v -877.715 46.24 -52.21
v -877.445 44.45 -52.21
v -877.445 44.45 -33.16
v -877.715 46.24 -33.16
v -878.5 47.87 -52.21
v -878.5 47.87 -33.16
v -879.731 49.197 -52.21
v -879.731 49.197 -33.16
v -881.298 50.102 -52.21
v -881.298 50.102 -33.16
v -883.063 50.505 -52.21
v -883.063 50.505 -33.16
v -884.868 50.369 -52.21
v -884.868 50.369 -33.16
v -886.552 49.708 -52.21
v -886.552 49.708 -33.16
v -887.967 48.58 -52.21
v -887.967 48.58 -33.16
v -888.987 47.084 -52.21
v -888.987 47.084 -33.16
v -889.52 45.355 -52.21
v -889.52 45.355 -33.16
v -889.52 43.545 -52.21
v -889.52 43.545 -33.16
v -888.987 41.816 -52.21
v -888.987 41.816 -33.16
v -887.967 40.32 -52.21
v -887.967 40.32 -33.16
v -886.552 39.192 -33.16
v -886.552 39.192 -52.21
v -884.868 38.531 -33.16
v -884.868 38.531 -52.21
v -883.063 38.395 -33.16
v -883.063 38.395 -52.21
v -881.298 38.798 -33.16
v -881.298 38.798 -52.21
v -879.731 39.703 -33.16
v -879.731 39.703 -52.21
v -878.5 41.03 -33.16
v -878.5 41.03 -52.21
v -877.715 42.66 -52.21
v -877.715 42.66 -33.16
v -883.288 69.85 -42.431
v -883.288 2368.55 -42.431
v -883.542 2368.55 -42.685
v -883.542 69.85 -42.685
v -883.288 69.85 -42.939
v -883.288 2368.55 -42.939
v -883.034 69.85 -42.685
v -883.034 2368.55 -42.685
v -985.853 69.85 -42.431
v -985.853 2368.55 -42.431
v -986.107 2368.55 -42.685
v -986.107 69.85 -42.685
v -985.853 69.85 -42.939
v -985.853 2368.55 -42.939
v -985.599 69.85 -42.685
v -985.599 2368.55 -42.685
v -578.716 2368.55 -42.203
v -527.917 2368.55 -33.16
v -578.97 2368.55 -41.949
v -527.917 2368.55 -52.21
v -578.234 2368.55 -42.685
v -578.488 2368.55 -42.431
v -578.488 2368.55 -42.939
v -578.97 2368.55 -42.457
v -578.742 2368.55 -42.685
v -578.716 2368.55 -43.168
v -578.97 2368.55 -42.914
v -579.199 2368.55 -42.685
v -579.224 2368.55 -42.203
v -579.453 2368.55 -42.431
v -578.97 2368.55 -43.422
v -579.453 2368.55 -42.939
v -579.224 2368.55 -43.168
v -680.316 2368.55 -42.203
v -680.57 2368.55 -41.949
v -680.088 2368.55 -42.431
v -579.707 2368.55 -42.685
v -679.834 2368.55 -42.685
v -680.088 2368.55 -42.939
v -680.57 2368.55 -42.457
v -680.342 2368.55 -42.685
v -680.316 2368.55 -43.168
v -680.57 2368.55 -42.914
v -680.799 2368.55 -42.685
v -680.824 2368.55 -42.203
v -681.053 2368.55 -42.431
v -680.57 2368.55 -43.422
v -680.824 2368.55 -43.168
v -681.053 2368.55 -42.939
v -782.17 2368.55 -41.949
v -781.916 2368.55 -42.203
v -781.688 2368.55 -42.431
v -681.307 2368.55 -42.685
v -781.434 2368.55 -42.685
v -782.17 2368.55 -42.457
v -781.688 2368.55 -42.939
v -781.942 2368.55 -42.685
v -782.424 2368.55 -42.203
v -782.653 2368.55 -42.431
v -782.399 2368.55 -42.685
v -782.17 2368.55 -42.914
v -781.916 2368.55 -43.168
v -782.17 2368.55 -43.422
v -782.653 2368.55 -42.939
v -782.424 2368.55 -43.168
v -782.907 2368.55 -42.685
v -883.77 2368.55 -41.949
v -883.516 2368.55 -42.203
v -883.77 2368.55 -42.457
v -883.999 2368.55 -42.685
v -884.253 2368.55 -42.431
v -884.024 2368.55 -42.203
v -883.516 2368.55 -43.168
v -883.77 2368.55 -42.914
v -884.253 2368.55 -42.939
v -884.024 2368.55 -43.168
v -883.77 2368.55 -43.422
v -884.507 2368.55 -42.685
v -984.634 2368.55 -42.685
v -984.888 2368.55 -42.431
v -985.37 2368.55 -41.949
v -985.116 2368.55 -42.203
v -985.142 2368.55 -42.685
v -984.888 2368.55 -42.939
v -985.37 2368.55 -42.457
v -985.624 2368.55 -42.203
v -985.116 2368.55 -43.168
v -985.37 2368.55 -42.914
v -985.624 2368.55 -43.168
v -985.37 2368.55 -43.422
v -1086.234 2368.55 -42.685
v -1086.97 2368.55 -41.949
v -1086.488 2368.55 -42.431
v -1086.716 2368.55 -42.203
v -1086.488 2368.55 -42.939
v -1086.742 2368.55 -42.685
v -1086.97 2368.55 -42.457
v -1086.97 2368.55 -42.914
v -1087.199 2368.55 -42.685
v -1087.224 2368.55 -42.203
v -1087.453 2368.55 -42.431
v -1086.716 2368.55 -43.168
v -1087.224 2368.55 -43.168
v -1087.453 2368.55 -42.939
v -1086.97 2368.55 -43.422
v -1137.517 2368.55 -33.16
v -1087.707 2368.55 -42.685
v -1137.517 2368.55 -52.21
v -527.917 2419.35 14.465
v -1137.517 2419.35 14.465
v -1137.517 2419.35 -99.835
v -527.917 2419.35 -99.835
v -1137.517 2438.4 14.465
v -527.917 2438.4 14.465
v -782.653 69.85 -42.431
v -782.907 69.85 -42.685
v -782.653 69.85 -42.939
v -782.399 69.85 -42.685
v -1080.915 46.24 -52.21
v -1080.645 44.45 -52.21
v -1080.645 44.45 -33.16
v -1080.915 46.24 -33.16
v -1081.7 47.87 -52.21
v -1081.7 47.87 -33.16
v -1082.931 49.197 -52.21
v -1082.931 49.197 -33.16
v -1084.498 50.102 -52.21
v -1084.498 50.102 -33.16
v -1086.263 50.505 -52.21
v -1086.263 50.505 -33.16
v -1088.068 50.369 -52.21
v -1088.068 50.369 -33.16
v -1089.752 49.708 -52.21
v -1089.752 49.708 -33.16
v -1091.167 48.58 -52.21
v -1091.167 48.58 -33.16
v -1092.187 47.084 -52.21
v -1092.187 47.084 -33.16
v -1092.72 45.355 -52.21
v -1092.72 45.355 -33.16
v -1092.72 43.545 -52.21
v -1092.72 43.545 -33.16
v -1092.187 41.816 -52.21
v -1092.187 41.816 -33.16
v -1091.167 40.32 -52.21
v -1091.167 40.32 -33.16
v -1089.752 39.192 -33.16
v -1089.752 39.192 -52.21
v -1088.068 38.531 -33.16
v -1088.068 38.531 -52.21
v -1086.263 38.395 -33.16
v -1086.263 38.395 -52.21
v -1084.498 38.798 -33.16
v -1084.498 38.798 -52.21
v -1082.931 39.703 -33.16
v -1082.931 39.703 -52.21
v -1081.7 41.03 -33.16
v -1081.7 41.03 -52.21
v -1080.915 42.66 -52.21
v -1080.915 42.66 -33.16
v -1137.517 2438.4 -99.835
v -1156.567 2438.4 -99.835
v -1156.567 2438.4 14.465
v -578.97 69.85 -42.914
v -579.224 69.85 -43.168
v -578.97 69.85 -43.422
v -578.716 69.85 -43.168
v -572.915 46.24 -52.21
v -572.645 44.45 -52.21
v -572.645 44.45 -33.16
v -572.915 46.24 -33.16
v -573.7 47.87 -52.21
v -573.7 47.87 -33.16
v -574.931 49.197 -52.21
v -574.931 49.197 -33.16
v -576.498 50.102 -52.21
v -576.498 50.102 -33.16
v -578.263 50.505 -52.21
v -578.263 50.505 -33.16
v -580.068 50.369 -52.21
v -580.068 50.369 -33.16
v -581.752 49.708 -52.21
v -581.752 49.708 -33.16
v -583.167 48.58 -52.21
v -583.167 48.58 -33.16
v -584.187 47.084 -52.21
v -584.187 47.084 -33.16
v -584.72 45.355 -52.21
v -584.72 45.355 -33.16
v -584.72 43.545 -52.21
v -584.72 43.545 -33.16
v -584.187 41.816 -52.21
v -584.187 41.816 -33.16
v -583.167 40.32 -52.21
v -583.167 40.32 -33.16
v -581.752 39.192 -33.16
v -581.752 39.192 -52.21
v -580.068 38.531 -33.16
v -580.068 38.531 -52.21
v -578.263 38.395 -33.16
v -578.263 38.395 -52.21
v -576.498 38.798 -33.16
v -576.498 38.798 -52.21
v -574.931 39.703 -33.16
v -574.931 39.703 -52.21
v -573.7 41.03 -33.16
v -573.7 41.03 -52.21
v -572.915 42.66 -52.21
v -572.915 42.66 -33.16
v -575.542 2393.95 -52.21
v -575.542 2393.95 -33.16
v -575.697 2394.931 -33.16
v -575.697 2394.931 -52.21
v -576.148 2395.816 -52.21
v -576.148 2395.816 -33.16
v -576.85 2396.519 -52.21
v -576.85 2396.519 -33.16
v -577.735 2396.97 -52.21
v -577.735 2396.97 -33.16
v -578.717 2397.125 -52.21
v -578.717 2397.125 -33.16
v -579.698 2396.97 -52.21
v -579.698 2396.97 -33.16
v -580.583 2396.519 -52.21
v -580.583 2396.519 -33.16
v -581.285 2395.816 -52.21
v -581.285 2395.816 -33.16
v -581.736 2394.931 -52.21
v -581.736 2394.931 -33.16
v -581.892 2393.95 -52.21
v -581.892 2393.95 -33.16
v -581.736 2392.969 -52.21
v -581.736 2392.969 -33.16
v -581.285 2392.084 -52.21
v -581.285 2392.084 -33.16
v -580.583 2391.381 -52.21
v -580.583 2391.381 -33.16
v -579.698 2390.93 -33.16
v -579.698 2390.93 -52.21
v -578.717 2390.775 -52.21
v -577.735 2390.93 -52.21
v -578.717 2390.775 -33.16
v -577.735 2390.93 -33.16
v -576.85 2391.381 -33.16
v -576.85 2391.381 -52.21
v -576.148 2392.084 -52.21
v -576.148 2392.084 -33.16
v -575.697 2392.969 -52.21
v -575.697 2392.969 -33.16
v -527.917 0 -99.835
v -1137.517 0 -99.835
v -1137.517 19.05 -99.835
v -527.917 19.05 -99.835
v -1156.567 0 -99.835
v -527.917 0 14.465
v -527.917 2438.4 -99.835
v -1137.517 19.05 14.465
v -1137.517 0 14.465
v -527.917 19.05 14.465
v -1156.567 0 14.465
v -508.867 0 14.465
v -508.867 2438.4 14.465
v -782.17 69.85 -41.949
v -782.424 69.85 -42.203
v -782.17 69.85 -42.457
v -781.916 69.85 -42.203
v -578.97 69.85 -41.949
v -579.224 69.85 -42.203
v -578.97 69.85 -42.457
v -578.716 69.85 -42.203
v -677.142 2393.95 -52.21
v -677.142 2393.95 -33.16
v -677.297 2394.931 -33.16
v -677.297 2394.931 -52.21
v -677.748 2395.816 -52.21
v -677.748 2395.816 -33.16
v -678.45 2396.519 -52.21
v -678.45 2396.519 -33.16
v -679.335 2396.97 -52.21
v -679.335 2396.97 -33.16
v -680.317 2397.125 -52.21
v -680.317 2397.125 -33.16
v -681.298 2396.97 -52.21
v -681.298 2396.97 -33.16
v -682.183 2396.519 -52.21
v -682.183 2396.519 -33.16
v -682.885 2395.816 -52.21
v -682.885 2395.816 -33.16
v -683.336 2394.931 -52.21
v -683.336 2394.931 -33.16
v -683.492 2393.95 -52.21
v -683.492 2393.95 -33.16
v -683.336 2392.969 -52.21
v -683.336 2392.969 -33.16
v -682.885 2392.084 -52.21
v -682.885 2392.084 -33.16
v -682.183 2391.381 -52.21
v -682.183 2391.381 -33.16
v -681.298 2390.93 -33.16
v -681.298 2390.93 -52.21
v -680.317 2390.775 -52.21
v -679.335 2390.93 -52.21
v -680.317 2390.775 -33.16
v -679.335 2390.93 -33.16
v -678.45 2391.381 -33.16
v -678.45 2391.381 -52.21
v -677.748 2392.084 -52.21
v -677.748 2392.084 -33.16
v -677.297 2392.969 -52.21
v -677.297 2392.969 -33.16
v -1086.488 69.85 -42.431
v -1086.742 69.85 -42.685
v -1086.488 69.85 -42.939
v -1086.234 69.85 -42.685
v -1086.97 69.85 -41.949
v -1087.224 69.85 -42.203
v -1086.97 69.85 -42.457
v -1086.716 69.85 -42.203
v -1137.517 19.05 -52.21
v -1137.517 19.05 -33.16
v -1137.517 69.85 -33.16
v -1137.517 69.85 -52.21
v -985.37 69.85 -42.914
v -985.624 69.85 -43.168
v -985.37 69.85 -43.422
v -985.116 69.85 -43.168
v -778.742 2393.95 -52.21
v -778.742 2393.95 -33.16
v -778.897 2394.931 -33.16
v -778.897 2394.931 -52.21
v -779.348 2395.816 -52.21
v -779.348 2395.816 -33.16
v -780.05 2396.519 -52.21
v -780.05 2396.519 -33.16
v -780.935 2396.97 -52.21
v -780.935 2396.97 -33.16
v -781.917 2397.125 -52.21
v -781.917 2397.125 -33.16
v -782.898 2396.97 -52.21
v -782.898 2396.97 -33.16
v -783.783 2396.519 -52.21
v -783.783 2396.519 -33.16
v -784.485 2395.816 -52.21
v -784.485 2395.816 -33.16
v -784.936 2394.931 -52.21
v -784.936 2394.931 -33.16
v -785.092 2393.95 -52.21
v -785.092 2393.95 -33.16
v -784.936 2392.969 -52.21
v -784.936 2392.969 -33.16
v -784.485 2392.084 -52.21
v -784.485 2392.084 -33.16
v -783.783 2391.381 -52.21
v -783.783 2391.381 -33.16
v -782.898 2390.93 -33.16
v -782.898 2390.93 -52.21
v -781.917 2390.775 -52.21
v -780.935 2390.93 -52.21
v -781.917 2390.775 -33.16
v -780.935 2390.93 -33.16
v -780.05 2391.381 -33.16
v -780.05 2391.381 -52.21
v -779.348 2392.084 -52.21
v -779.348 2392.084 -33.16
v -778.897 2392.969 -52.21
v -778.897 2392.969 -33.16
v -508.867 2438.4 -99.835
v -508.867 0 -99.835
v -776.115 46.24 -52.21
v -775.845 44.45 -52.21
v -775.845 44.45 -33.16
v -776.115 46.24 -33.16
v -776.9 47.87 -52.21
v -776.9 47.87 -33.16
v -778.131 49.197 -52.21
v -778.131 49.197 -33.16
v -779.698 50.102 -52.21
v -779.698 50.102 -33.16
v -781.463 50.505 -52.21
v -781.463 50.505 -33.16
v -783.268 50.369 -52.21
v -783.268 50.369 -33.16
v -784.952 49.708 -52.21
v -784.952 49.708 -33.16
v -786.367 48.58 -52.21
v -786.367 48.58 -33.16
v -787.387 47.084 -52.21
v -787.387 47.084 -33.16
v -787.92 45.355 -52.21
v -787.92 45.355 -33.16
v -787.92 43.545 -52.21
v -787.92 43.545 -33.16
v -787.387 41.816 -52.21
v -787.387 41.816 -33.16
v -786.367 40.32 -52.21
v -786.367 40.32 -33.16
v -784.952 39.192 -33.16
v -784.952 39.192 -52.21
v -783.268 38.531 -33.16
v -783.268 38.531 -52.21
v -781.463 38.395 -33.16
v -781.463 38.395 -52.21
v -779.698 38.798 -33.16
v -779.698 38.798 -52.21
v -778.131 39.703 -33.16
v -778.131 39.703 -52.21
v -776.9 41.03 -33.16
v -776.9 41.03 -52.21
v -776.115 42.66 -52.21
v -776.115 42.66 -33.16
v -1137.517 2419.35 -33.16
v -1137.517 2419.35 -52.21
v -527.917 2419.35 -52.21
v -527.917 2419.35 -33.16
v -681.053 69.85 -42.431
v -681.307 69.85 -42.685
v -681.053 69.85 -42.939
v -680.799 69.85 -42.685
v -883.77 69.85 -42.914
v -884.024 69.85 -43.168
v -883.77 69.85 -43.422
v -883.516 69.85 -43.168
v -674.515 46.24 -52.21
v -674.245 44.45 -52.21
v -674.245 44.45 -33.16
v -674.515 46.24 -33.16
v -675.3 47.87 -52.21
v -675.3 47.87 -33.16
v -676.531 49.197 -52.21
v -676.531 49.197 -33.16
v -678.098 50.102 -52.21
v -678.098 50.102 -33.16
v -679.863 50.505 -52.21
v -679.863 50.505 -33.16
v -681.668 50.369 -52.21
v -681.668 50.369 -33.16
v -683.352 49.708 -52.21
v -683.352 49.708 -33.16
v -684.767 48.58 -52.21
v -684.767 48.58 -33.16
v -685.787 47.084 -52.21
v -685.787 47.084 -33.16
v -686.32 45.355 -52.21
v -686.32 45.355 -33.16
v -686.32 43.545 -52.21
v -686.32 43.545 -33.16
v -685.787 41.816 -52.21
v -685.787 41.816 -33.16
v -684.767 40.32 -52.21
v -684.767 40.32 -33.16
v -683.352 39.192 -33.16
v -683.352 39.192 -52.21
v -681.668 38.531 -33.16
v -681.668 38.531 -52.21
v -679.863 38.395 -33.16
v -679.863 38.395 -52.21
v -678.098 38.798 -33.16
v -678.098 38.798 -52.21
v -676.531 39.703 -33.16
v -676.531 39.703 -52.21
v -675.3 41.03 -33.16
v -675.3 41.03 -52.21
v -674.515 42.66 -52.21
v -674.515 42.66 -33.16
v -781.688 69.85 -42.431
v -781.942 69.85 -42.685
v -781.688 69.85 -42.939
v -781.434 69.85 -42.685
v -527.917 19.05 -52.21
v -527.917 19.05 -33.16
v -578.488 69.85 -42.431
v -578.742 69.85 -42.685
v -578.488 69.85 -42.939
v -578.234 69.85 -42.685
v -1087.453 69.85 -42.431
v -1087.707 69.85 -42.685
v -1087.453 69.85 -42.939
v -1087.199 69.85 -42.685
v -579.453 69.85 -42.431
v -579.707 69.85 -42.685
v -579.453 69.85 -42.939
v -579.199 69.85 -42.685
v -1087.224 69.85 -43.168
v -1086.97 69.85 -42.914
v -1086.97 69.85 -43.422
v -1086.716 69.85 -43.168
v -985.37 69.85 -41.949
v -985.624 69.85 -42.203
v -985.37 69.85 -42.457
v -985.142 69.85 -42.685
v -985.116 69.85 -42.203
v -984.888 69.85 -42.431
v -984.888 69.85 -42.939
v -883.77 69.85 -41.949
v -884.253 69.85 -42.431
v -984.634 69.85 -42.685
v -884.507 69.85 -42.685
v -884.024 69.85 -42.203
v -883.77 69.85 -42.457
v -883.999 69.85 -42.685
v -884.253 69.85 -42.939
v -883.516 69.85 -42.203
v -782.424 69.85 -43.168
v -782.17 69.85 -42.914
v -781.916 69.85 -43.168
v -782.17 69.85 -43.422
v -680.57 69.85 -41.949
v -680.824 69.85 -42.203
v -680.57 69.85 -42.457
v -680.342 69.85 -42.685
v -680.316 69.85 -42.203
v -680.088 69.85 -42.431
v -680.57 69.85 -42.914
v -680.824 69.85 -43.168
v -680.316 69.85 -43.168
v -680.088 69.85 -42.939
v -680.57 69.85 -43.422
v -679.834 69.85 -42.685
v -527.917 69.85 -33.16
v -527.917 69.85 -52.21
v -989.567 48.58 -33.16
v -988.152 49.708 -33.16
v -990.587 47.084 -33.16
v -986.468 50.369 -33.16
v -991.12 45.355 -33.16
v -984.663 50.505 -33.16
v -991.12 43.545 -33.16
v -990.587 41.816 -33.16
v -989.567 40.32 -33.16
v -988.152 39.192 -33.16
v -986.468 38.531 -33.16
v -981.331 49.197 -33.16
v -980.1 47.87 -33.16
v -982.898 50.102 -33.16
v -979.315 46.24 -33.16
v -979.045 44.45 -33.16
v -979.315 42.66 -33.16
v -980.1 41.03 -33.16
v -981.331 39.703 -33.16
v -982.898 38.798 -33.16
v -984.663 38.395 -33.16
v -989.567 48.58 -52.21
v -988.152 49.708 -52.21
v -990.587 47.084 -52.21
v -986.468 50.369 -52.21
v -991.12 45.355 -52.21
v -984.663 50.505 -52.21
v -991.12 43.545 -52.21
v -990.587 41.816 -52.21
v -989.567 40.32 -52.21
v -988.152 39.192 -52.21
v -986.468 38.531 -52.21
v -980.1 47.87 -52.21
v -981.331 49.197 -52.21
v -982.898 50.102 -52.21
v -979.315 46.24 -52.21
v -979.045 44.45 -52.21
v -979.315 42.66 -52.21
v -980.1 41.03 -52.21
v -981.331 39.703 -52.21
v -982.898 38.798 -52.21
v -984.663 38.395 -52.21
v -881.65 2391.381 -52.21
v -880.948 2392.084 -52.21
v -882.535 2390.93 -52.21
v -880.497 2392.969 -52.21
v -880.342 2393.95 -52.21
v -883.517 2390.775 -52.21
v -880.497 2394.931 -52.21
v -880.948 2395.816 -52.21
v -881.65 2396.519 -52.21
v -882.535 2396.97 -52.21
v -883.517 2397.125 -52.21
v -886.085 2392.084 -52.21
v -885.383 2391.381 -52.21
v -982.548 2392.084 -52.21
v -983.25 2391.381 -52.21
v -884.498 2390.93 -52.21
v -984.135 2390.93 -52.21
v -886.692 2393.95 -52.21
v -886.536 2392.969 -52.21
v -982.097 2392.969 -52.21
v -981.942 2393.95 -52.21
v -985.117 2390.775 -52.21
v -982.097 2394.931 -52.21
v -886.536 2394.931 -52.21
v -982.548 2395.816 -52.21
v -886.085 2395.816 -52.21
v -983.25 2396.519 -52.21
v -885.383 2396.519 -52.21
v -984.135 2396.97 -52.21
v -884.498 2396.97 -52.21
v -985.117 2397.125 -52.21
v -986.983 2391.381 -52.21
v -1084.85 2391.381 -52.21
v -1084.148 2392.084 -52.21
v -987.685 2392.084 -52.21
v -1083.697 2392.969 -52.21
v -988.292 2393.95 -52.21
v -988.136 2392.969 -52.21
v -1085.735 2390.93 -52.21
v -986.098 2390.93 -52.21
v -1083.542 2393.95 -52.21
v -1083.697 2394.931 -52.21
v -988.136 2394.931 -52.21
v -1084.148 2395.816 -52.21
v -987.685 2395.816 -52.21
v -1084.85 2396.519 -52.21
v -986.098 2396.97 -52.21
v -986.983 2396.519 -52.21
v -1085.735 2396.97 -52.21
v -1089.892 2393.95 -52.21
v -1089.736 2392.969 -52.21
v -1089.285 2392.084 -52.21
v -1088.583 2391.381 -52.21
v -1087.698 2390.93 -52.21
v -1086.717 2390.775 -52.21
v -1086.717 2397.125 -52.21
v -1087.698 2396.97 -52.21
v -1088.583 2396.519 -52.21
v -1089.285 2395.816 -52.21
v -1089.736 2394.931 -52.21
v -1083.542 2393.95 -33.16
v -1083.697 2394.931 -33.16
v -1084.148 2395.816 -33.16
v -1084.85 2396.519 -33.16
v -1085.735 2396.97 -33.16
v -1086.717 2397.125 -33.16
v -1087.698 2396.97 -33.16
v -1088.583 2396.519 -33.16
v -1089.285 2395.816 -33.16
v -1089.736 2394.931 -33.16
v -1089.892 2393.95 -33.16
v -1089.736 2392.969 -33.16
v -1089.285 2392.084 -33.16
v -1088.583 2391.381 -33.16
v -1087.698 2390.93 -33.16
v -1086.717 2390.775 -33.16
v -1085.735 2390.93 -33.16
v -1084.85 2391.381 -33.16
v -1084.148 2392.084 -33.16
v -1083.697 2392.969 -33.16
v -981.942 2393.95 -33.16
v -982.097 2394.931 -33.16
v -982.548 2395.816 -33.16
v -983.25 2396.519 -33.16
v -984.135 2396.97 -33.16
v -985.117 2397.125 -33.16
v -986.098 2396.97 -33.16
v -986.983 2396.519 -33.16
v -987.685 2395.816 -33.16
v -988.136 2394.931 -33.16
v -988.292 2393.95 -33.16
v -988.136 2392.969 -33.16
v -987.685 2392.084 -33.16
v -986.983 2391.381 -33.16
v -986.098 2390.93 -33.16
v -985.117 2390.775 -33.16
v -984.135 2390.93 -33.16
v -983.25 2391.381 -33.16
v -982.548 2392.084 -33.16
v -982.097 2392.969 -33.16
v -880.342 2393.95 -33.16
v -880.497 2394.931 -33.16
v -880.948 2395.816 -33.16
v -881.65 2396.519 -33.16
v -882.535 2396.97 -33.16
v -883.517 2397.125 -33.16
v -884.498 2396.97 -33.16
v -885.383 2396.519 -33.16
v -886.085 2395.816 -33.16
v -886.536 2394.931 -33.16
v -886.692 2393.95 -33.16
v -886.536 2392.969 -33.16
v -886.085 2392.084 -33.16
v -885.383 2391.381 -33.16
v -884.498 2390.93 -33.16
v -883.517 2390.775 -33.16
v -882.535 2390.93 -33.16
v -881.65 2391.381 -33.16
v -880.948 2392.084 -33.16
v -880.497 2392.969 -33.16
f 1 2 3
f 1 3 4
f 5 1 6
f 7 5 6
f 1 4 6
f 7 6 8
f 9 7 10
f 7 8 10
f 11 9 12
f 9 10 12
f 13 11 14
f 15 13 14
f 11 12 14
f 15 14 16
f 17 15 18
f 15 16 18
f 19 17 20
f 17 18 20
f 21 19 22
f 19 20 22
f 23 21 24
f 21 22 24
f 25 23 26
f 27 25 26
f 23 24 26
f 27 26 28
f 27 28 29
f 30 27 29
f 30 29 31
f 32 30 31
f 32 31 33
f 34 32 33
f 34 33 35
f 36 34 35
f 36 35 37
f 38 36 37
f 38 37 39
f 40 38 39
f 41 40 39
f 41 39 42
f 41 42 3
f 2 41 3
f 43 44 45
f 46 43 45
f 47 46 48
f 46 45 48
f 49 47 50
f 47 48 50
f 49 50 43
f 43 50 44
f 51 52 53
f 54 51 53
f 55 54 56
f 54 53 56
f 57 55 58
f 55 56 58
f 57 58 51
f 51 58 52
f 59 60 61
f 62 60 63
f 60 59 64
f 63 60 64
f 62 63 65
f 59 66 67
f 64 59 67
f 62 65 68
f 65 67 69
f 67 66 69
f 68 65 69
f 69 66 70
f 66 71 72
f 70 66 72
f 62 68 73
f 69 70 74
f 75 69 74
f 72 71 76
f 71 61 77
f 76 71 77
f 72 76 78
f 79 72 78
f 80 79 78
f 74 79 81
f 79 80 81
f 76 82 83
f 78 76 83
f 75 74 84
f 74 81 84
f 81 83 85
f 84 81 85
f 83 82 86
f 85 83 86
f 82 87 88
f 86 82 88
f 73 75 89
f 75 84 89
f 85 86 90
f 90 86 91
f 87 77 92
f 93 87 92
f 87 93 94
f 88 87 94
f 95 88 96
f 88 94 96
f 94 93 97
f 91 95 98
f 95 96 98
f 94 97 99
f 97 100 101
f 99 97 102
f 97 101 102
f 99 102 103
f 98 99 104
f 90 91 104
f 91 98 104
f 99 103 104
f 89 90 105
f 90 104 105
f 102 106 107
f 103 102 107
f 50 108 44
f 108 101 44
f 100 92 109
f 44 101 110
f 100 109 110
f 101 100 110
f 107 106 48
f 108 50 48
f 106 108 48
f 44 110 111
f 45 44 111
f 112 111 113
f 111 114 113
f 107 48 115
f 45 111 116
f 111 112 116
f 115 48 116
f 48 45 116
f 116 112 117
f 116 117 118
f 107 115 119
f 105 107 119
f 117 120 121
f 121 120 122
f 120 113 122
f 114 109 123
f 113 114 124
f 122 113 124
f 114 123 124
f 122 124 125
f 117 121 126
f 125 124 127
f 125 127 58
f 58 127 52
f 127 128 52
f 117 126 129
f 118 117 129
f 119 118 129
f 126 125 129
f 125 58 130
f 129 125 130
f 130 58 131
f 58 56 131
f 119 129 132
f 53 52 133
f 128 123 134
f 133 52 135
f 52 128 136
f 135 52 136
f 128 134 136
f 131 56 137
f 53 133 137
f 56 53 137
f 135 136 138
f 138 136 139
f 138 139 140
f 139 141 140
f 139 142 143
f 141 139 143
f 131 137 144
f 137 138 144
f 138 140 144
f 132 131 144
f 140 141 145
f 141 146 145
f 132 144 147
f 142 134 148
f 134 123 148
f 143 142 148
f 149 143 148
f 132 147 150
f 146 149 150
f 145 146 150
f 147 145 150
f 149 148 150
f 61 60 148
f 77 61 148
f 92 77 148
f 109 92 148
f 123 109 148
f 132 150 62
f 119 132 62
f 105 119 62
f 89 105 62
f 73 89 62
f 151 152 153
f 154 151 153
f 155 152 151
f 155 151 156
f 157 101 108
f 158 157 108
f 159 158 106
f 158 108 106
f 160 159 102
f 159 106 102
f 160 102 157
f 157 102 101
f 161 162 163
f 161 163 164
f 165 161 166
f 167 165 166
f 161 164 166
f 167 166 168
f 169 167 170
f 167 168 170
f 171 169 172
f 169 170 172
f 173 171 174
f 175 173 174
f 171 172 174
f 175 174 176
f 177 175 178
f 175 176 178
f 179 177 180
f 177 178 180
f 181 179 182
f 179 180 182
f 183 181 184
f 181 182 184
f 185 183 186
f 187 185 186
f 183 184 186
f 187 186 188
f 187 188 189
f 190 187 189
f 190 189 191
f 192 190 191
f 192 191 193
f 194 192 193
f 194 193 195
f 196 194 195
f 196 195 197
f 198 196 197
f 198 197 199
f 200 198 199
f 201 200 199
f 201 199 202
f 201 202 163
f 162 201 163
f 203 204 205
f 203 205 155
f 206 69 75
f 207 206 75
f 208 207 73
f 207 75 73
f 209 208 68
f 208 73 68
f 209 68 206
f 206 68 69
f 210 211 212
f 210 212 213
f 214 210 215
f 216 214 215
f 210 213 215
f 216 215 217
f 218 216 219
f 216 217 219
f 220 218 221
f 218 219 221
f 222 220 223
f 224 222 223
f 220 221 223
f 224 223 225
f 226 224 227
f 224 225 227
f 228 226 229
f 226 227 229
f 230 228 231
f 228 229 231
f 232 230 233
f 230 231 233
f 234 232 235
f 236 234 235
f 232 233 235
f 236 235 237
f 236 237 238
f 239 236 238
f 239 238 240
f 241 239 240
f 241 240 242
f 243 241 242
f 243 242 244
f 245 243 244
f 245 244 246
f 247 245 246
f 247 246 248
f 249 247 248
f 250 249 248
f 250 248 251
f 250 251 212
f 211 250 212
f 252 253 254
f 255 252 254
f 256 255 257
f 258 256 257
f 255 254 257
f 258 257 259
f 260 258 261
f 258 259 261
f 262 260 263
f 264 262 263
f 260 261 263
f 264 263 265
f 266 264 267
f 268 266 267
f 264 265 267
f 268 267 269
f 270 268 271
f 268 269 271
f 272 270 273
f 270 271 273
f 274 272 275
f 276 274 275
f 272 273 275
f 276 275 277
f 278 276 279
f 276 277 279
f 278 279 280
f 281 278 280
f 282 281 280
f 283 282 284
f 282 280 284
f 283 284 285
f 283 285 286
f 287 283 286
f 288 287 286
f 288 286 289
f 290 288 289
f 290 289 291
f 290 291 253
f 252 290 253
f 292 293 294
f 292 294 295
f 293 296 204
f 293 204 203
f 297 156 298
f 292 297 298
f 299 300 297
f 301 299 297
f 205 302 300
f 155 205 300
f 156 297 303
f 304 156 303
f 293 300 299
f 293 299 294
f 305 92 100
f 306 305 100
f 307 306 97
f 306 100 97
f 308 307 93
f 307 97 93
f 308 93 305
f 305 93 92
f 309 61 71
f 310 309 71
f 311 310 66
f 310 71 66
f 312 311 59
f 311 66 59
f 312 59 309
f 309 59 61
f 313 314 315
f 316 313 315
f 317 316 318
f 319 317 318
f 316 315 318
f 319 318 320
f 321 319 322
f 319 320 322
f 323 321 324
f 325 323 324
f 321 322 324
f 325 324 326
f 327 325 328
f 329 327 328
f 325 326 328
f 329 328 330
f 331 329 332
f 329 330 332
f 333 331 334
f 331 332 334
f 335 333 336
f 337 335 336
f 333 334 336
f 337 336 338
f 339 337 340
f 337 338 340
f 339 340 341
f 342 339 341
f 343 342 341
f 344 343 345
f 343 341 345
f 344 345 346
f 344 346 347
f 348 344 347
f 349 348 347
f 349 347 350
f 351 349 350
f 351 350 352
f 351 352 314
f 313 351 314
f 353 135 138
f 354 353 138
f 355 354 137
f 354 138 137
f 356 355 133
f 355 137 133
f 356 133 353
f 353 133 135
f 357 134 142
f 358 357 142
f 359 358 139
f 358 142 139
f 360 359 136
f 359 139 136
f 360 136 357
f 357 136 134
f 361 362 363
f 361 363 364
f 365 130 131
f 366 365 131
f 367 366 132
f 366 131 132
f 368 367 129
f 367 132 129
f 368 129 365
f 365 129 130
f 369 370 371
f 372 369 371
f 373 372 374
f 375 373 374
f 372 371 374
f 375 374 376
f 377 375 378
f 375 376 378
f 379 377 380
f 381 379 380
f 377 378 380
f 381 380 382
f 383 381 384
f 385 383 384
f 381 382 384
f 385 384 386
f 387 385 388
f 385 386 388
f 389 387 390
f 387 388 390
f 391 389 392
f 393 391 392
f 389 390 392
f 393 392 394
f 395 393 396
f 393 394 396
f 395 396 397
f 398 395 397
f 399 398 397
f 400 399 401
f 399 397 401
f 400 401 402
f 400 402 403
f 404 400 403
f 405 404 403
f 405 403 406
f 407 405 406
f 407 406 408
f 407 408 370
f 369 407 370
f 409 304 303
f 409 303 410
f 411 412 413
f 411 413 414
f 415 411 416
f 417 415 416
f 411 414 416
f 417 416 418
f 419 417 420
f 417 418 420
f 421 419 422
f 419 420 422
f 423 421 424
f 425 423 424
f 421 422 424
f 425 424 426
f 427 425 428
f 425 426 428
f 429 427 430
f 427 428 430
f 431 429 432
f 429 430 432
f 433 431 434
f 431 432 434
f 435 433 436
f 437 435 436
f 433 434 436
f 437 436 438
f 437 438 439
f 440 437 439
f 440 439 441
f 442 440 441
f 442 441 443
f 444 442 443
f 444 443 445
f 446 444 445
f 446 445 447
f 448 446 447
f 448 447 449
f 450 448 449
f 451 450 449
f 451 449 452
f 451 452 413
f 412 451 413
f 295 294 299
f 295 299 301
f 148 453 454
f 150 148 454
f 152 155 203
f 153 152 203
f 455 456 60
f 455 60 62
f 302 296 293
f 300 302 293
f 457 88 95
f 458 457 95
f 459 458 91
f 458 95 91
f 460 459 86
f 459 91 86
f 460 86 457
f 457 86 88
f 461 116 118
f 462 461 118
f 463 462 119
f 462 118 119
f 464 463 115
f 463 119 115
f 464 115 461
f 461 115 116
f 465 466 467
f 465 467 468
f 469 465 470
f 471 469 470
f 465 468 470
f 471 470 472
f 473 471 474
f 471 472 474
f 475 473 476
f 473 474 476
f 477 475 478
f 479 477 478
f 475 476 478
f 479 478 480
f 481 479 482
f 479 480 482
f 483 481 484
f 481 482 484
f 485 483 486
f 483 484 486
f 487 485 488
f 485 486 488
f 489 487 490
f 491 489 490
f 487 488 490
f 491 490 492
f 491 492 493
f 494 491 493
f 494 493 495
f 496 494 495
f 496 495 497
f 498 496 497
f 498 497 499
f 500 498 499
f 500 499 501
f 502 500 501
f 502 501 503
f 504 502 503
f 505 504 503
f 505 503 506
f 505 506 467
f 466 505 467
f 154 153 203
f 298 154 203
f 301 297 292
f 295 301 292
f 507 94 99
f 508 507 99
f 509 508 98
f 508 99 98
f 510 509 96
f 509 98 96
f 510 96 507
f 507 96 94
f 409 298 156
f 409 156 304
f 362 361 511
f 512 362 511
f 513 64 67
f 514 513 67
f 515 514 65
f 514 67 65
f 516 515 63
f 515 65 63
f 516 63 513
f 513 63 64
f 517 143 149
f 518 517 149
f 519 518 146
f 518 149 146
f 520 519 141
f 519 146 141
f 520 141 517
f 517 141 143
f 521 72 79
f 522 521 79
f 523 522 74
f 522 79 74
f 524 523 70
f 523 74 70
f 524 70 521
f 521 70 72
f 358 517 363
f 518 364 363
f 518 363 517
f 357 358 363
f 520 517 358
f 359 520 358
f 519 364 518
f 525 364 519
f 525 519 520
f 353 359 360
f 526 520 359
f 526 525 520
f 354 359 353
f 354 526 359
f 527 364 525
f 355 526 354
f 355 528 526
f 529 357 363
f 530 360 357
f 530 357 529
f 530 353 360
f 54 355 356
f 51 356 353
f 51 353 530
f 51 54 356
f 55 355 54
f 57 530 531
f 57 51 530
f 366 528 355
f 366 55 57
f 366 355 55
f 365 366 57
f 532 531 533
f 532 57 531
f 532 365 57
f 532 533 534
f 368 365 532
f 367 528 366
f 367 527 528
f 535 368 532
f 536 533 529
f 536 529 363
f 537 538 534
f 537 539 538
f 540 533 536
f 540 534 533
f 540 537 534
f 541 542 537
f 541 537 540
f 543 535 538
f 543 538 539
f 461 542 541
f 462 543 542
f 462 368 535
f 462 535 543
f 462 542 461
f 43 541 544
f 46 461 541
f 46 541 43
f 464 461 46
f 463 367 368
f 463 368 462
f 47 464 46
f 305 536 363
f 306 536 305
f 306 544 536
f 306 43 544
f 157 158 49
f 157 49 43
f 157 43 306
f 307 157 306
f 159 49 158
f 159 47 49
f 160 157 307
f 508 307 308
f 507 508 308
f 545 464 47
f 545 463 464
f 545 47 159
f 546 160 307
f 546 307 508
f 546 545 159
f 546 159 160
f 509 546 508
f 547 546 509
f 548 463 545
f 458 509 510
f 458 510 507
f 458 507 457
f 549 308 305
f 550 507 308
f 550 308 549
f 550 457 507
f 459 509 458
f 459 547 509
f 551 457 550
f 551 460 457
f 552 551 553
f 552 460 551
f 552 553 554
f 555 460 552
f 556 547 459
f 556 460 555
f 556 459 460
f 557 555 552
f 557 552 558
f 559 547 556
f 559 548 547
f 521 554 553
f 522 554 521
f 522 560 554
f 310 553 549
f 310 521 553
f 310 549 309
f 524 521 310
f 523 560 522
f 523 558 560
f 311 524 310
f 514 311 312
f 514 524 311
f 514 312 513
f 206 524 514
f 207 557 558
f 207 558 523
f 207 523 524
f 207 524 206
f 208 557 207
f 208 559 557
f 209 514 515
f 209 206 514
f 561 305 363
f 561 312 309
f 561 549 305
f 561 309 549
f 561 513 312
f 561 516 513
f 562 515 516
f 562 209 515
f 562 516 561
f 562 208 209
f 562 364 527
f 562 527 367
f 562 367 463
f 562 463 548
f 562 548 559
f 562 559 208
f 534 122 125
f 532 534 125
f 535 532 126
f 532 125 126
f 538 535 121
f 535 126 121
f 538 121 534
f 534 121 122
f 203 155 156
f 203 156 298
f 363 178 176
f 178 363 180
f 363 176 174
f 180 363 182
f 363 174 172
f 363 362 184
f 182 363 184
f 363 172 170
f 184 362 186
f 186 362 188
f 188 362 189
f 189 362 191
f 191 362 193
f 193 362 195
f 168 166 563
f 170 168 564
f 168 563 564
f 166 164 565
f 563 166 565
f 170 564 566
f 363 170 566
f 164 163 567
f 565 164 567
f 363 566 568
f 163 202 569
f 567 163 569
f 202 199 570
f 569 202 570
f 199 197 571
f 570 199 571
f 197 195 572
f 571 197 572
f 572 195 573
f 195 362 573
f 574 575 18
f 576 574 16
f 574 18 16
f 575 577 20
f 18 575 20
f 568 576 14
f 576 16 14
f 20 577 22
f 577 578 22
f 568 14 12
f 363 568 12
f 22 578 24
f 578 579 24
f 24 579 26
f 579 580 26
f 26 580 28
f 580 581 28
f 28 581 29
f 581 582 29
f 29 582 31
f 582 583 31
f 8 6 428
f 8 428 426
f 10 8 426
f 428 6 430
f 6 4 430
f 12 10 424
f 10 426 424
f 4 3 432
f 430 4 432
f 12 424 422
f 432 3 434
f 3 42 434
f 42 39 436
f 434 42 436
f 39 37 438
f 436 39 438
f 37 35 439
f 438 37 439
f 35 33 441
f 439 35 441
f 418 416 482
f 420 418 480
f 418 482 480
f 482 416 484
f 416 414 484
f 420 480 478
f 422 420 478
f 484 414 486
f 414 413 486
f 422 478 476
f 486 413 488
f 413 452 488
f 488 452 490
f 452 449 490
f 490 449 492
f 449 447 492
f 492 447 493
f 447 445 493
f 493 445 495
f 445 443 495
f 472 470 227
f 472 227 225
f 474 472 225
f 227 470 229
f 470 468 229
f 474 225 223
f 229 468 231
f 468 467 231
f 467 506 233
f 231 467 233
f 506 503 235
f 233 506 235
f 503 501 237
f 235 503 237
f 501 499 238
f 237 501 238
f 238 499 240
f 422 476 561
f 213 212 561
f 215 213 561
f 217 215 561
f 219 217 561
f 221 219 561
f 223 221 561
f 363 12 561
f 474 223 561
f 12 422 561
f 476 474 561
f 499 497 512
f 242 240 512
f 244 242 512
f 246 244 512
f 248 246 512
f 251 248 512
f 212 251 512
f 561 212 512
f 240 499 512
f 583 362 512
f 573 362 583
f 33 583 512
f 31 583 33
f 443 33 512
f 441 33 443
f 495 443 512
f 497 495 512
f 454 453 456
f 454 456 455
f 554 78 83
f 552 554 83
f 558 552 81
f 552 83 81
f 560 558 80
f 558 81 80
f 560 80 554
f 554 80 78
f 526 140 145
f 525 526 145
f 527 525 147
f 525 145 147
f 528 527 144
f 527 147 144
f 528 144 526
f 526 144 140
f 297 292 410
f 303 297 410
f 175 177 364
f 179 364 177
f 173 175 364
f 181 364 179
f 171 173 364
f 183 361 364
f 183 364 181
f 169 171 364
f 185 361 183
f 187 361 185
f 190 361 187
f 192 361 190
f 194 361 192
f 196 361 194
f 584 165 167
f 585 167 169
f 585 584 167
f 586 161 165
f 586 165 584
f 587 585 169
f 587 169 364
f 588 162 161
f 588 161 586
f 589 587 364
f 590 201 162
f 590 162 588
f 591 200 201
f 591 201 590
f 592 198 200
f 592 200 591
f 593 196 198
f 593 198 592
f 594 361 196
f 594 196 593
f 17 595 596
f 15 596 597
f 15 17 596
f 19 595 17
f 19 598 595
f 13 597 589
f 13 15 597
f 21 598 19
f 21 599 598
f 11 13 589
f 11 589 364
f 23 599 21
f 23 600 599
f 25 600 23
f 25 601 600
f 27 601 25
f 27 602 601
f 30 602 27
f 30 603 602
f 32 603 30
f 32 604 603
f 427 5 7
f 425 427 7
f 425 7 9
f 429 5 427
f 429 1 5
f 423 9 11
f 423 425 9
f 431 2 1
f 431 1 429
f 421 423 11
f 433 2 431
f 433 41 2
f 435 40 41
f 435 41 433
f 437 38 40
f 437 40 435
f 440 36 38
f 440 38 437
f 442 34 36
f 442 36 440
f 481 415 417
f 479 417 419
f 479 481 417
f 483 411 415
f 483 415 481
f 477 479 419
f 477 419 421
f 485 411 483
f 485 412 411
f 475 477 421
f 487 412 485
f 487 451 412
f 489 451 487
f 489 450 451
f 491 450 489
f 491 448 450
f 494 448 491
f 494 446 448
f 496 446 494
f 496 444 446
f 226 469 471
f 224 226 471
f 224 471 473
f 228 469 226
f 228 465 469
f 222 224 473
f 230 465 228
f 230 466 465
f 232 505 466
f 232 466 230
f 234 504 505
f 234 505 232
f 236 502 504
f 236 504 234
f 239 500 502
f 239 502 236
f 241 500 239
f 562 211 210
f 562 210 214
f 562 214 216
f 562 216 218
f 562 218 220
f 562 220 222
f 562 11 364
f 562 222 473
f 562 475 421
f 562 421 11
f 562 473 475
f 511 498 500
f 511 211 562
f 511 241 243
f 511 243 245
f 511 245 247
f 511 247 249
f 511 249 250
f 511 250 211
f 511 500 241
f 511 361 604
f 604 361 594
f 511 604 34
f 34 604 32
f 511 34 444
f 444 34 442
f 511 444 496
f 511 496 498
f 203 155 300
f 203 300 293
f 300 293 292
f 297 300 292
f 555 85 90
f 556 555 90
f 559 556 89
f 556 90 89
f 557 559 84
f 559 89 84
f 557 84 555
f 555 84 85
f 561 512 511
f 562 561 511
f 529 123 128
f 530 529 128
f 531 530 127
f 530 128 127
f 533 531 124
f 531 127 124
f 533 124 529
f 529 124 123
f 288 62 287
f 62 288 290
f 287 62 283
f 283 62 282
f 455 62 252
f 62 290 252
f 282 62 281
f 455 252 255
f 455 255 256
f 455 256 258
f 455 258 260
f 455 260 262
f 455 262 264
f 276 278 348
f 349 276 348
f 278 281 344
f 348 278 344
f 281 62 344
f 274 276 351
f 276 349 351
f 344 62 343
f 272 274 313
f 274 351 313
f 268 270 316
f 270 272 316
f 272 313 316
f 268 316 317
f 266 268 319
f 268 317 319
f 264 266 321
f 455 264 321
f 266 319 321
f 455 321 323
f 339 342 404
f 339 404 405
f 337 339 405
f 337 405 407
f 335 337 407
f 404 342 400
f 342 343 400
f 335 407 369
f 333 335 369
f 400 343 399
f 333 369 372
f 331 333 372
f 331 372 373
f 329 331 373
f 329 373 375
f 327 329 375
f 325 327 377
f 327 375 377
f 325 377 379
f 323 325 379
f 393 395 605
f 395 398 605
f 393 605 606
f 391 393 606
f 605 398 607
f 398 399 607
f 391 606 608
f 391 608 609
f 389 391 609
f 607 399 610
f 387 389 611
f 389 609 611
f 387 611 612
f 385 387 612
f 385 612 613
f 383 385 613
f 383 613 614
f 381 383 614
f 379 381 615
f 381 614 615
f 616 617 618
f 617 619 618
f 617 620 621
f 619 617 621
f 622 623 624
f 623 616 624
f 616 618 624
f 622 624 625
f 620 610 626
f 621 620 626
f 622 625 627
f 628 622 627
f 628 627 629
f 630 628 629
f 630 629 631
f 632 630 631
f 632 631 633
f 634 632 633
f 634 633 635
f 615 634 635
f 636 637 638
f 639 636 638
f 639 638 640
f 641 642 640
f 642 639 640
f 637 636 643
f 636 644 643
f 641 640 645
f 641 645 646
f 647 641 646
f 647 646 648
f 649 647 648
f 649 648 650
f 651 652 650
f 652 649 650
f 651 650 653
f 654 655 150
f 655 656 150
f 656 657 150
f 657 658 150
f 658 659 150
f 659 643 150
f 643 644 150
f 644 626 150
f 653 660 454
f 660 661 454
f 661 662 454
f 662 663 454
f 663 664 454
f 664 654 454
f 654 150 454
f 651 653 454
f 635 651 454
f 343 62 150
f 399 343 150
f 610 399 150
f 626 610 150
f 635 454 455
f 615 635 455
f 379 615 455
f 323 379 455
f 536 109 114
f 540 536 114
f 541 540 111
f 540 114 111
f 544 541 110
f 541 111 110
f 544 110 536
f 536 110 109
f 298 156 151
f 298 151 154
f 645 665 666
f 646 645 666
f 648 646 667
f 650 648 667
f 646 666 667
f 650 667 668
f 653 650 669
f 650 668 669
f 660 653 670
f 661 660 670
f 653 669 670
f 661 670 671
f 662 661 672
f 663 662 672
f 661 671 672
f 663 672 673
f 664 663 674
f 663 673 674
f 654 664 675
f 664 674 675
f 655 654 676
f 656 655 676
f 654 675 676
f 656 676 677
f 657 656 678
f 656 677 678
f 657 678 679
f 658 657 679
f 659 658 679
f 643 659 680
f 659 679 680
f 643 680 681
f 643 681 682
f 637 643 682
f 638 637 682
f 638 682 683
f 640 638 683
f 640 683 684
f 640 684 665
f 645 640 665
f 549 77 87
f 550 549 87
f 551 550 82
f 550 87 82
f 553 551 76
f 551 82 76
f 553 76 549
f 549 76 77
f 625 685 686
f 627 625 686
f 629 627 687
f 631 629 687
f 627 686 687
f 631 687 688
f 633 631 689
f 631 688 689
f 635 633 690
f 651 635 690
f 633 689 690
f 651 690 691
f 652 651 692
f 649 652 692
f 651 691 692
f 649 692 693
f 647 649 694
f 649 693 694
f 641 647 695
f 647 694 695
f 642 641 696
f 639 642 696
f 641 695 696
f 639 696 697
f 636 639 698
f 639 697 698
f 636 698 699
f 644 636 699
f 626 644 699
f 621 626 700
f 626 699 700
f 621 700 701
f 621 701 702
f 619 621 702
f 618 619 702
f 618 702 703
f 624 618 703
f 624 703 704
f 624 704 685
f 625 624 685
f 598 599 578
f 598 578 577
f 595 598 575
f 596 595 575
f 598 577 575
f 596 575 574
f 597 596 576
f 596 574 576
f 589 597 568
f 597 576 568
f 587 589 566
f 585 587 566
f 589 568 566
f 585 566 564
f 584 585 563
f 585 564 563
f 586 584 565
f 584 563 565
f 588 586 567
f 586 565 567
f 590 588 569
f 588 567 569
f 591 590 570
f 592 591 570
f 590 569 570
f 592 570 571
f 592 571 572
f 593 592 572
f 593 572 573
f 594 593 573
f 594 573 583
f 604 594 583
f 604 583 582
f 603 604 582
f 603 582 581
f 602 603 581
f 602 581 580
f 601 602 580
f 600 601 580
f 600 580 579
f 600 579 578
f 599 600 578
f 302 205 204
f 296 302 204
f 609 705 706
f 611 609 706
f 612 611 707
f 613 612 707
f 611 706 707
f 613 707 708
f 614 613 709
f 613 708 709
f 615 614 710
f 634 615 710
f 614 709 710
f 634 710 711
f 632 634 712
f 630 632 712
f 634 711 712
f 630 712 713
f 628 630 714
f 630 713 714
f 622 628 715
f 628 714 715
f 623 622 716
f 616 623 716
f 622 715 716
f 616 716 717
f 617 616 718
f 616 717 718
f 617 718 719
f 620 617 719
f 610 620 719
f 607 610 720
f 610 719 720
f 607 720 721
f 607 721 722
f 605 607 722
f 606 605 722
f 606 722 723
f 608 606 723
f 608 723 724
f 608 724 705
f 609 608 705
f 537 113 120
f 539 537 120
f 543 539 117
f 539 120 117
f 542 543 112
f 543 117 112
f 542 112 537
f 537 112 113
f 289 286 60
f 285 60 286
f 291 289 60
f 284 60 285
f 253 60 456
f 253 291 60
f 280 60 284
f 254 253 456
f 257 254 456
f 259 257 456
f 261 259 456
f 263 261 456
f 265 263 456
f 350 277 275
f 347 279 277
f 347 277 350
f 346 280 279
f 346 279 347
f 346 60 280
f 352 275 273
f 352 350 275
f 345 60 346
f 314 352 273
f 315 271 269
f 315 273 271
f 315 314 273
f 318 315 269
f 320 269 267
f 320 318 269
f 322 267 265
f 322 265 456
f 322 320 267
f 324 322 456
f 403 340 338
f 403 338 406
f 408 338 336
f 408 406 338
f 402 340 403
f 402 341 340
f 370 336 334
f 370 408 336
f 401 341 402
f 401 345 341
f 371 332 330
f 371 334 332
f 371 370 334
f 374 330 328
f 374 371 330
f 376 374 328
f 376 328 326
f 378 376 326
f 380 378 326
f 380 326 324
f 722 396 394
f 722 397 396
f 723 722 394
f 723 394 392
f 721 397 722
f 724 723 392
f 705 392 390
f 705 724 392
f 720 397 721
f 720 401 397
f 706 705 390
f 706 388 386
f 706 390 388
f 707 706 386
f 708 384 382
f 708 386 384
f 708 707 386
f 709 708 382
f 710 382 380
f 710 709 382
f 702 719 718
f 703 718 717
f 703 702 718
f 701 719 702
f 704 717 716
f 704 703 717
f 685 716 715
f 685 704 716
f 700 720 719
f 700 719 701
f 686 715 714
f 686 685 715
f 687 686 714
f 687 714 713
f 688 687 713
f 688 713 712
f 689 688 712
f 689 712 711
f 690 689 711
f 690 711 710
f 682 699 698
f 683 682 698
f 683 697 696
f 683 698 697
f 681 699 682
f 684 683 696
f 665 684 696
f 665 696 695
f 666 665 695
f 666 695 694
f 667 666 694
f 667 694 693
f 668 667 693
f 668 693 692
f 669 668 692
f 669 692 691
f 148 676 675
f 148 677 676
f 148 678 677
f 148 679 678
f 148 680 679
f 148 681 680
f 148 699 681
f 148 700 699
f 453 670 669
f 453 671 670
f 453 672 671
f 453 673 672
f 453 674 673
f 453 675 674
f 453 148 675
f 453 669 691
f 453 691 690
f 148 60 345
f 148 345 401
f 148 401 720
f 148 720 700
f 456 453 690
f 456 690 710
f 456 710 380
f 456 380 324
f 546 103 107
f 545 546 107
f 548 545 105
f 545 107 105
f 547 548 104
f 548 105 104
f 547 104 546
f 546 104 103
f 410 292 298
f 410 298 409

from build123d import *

# Parameters (mm, degrees)
SKETCH1_W             = 609.6
SKETCH1_H             = 114.3
BOSS_EXTRUDE1_DEPTH   = 19.05
SKETCH2_W             = 19.05
SKETCH2_H             = 114.3
BOSS_EXTRUDE2_DEPTH   = 2438.4
BOSS_EXTRUDE2_2_DEPTH = 2438.4
SKETCH3_W             = 114.3
SKETCH3_H             = 19.05
BOSS_EXTRUDE3_DEPTH   = 609.6
SKETCH4_W             = 609.6
SKETCH4_H             = 19.05
BOSS_EXTRUDE4_DEPTH   = 50.8
SKETCH5_W             = 19.05
SKETCH5_H             = 50.8
BOSS_EXTRUDE5_DEPTH   = 609.6
SKETCH7_R             = 3.175
SKETCH7_R_2           = 6.071594162
CUT_EXTRUDE1_DEPTH    = 50.8
SKETCH8_R             = 0.254
BOSS_EXTRUDE6_DEPTH   = 2298.7


with BuildPart() as part:
    # Sketch1 → Boss-Extrude1 (new body)
    with BuildSketch(Plane(origin=(0, 0, 0), x_dir=(1, 0, 0), z_dir=(0, 1, 0))):
        with Locations((-832.71662531, 42.685235732)):
            Rectangle(SKETCH1_W, SKETCH1_H)
    extrude(amount=BOSS_EXTRUDE1_DEPTH)


with BuildPart() as body_2:
    # Sketch2 → Boss-Extrude2 (new body)
    with BuildSketch(Plane(origin=(0, 0, 0), x_dir=(1, 0, 0), z_dir=(0, 1, 0))):
        with Locations((-518.39162531, 42.685235732)):
            Rectangle(SKETCH2_W, SKETCH2_H)
    extrude(amount=BOSS_EXTRUDE2_DEPTH)


with BuildPart() as body_3:
    # Sketch2 → Boss-Extrude2 2 (new body)
    with BuildSketch(Plane(origin=(0, 0, 0), x_dir=(1, 0, 0), z_dir=(0, 1, 0))):
        with Locations((-1147.04162531, 42.685235732)):
            Rectangle(SKETCH2_W, SKETCH2_H)
    extrude(amount=BOSS_EXTRUDE2_2_DEPTH)


with BuildPart() as body_4:
    # Sketch3 → Boss-Extrude3 (new body)
    with BuildSketch(Plane(origin=(-1137.51662531, 0, 0), x_dir=(0, 0, -1), z_dir=(1, 0, 0))):
        with Locations((42.685235732, 2428.875)):
            Rectangle(SKETCH3_W, SKETCH3_H)
    extrude(amount=BOSS_EXTRUDE3_DEPTH)


with BuildPart() as body_5:
    # Sketch4 → Boss-Extrude4 (new body)
    with BuildSketch(Plane(origin=(0, 19.05, 0), x_dir=(1, 0, 0), z_dir=(0, 1, 0))):
        with Locations((-832.71662531, 42.685235732)):
            Rectangle(SKETCH4_W, SKETCH4_H)
    extrude(amount=BOSS_EXTRUDE4_DEPTH)


with BuildPart() as body_6:
    # Sketch5 → Boss-Extrude5 (new body)
    with BuildSketch(Plane(origin=(-1137.51662531, 0, 0), x_dir=(0, 0, -1), z_dir=(1, 0, 0))):
        with Locations((42.685235732, 2393.95)):
            Rectangle(SKETCH5_W, SKETCH5_H)
    extrude(amount=BOSS_EXTRUDE5_DEPTH)


with BuildPart() as cut_extrude1_tool:
    # Sketch7 → Cut-Extrude1 (new body)
    with BuildSketch(Plane.XY.offset(-33.160235732)):
        with Locations((-1086.71662531, 2393.95)):
            Circle(SKETCH7_R)
        with Locations((-985.11662531, 2393.95)):
            Circle(SKETCH7_R)
        with Locations((-883.51662531, 2393.95)):
            Circle(SKETCH7_R)
        with Locations((-781.91662531, 2393.95)):
            Circle(SKETCH7_R)
        with Locations((-680.31662531, 2393.95)):
            Circle(SKETCH7_R)
        with Locations((-578.71662531, 2393.95)):
            Circle(SKETCH7_R)
        with Locations((-1086.71662531, 44.45)):
            Circle(SKETCH7_R_2)
        with Locations((-985.11662531, 44.45)):
            Circle(SKETCH7_R_2)
        with Locations((-883.51662531, 44.45)):
            Circle(SKETCH7_R_2)
        with Locations((-781.91662531, 44.45)):
            Circle(SKETCH7_R_2)
        with Locations((-680.31662531, 44.45)):
            Circle(SKETCH7_R_2)
        with Locations((-578.71662531, 44.45)):
            Circle(SKETCH7_R_2)
    extrude(amount=-CUT_EXTRUDE1_DEPTH)


with BuildPart() as body_5_1:
    add(body_5.part)

    # Cut-Extrude1: cut by cut_extrude1_tool
    add(cut_extrude1_tool.part, mode=Mode.SUBTRACT)



with BuildPart() as body_6_1:
    add(body_6.part)

    # Cut-Extrude1: cut by cut_extrude1_tool
    add(cut_extrude1_tool.part, mode=Mode.SUBTRACT)


with BuildPart() as body_5_2:
    add(body_5_1.part)

    add(body_6_1.part)  # Boss-Extrude6 merges body 6
    # Sketch8 → Boss-Extrude6 (add)
    with BuildSketch(Plane.XZ.offset(-2368.55)):
        with Locations(Location((-1086.970147606, -42.202644807, 0), (0, 0, 89.999999999))):  # turned: the seam where the file's is
            Circle(SKETCH8_R)
        with Locations(Location((-1086.487556681, -42.685235732, 0), (0, 0, 90.000000001))):  # turned: the seam where the file's is
            Circle(SKETCH8_R)
        with Locations(Location((-1086.970147606, -43.167826657, 0), (0, 0, 89.999999999))):  # turned: the seam where the file's is
            Circle(SKETCH8_R)
        with Locations(Location((-1087.452738531, -42.685235732, 0), (0, 0, 90.000000001))):  # turned: the seam where the file's is
            Circle(SKETCH8_R)
        with Locations(Location((-985.852738531, -42.685235732, 0), (0, 0, 90))):  # turned: the seam where the file's is
            Circle(SKETCH8_R)
        with Locations(Location((-985.370147606, -43.167826657, 0), (0, 0, 90))):  # turned: the seam where the file's is
            Circle(SKETCH8_R)
        with Locations(Location((-985.370147606, -42.202644807, 0), (0, 0, 90))):  # turned: the seam where the file's is
            Circle(SKETCH8_R)
        with Locations(Location((-984.887556681, -42.685235732, 0), (0, 0, 90))):  # turned: the seam where the file's is
            Circle(SKETCH8_R)
        with Locations(Location((-884.252738531, -42.685235732, 0), (0, 0, 90))):  # turned: the seam where the file's is
            Circle(SKETCH8_R)
        with Locations(Location((-883.770147606, -43.167826657, 0), (0, 0, 90))):  # turned: the seam where the file's is
            Circle(SKETCH8_R)
        with Locations(Location((-883.770147606, -42.202644807, 0), (0, 0, 90))):  # turned: the seam where the file's is
            Circle(SKETCH8_R)
        with Locations(Location((-883.287556681, -42.685235732, 0), (0, 0, 90))):  # turned: the seam where the file's is
            Circle(SKETCH8_R)
        with Locations(Location((-782.652738531, -42.685235732, 0), (0, 0, 90))):  # turned: the seam where the file's is
            Circle(SKETCH8_R)
        with Locations(Location((-782.170147606, -43.167826657, 0), (0, 0, 90))):  # turned: the seam where the file's is
            Circle(SKETCH8_R)
        with Locations(Location((-782.170147606, -42.202644807, 0), (0, 0, 90))):  # turned: the seam where the file's is
            Circle(SKETCH8_R)
        with Locations(Location((-781.687556681, -42.685235732, 0), (0, 0, 90))):  # turned: the seam where the file's is
            Circle(SKETCH8_R)
        with Locations(Location((-681.052738531, -42.685235732, 0), (0, 0, 90))):  # turned: the seam where the file's is
            Circle(SKETCH8_R)
        with Locations(Location((-680.570147606, -43.167826657, 0), (0, 0, 90))):  # turned: the seam where the file's is
            Circle(SKETCH8_R)
        with Locations(Location((-680.570147606, -42.202644807, 0), (0, 0, 90))):  # turned: the seam where the file's is
            Circle(SKETCH8_R)
        with Locations(Location((-680.087556681, -42.685235732, 0), (0, 0, 90))):  # turned: the seam where the file's is
            Circle(SKETCH8_R)
        with Locations(Location((-579.452738531, -42.685235732, 0), (0, 0, 90))):  # turned: the seam where the file's is
            Circle(SKETCH8_R)
        with Locations(Location((-578.970147606, -43.167826657, 0), (0, 0, 90))):  # turned: the seam where the file's is
            Circle(SKETCH8_R)
        with Locations(Location((-578.970147606, -42.202644807, 0), (0, 0, 90))):  # turned: the seam where the file's is
            Circle(SKETCH8_R)
        with Locations(Location((-578.487556681, -42.685235732, 0), (0, 0, 90))):  # turned: the seam where the file's is
            Circle(SKETCH8_R)
    extrude(amount=BOSS_EXTRUDE6_DEPTH)


solid = Compound([part.part, body_2.part, body_3.part, body_4.part, body_5_2.part])
